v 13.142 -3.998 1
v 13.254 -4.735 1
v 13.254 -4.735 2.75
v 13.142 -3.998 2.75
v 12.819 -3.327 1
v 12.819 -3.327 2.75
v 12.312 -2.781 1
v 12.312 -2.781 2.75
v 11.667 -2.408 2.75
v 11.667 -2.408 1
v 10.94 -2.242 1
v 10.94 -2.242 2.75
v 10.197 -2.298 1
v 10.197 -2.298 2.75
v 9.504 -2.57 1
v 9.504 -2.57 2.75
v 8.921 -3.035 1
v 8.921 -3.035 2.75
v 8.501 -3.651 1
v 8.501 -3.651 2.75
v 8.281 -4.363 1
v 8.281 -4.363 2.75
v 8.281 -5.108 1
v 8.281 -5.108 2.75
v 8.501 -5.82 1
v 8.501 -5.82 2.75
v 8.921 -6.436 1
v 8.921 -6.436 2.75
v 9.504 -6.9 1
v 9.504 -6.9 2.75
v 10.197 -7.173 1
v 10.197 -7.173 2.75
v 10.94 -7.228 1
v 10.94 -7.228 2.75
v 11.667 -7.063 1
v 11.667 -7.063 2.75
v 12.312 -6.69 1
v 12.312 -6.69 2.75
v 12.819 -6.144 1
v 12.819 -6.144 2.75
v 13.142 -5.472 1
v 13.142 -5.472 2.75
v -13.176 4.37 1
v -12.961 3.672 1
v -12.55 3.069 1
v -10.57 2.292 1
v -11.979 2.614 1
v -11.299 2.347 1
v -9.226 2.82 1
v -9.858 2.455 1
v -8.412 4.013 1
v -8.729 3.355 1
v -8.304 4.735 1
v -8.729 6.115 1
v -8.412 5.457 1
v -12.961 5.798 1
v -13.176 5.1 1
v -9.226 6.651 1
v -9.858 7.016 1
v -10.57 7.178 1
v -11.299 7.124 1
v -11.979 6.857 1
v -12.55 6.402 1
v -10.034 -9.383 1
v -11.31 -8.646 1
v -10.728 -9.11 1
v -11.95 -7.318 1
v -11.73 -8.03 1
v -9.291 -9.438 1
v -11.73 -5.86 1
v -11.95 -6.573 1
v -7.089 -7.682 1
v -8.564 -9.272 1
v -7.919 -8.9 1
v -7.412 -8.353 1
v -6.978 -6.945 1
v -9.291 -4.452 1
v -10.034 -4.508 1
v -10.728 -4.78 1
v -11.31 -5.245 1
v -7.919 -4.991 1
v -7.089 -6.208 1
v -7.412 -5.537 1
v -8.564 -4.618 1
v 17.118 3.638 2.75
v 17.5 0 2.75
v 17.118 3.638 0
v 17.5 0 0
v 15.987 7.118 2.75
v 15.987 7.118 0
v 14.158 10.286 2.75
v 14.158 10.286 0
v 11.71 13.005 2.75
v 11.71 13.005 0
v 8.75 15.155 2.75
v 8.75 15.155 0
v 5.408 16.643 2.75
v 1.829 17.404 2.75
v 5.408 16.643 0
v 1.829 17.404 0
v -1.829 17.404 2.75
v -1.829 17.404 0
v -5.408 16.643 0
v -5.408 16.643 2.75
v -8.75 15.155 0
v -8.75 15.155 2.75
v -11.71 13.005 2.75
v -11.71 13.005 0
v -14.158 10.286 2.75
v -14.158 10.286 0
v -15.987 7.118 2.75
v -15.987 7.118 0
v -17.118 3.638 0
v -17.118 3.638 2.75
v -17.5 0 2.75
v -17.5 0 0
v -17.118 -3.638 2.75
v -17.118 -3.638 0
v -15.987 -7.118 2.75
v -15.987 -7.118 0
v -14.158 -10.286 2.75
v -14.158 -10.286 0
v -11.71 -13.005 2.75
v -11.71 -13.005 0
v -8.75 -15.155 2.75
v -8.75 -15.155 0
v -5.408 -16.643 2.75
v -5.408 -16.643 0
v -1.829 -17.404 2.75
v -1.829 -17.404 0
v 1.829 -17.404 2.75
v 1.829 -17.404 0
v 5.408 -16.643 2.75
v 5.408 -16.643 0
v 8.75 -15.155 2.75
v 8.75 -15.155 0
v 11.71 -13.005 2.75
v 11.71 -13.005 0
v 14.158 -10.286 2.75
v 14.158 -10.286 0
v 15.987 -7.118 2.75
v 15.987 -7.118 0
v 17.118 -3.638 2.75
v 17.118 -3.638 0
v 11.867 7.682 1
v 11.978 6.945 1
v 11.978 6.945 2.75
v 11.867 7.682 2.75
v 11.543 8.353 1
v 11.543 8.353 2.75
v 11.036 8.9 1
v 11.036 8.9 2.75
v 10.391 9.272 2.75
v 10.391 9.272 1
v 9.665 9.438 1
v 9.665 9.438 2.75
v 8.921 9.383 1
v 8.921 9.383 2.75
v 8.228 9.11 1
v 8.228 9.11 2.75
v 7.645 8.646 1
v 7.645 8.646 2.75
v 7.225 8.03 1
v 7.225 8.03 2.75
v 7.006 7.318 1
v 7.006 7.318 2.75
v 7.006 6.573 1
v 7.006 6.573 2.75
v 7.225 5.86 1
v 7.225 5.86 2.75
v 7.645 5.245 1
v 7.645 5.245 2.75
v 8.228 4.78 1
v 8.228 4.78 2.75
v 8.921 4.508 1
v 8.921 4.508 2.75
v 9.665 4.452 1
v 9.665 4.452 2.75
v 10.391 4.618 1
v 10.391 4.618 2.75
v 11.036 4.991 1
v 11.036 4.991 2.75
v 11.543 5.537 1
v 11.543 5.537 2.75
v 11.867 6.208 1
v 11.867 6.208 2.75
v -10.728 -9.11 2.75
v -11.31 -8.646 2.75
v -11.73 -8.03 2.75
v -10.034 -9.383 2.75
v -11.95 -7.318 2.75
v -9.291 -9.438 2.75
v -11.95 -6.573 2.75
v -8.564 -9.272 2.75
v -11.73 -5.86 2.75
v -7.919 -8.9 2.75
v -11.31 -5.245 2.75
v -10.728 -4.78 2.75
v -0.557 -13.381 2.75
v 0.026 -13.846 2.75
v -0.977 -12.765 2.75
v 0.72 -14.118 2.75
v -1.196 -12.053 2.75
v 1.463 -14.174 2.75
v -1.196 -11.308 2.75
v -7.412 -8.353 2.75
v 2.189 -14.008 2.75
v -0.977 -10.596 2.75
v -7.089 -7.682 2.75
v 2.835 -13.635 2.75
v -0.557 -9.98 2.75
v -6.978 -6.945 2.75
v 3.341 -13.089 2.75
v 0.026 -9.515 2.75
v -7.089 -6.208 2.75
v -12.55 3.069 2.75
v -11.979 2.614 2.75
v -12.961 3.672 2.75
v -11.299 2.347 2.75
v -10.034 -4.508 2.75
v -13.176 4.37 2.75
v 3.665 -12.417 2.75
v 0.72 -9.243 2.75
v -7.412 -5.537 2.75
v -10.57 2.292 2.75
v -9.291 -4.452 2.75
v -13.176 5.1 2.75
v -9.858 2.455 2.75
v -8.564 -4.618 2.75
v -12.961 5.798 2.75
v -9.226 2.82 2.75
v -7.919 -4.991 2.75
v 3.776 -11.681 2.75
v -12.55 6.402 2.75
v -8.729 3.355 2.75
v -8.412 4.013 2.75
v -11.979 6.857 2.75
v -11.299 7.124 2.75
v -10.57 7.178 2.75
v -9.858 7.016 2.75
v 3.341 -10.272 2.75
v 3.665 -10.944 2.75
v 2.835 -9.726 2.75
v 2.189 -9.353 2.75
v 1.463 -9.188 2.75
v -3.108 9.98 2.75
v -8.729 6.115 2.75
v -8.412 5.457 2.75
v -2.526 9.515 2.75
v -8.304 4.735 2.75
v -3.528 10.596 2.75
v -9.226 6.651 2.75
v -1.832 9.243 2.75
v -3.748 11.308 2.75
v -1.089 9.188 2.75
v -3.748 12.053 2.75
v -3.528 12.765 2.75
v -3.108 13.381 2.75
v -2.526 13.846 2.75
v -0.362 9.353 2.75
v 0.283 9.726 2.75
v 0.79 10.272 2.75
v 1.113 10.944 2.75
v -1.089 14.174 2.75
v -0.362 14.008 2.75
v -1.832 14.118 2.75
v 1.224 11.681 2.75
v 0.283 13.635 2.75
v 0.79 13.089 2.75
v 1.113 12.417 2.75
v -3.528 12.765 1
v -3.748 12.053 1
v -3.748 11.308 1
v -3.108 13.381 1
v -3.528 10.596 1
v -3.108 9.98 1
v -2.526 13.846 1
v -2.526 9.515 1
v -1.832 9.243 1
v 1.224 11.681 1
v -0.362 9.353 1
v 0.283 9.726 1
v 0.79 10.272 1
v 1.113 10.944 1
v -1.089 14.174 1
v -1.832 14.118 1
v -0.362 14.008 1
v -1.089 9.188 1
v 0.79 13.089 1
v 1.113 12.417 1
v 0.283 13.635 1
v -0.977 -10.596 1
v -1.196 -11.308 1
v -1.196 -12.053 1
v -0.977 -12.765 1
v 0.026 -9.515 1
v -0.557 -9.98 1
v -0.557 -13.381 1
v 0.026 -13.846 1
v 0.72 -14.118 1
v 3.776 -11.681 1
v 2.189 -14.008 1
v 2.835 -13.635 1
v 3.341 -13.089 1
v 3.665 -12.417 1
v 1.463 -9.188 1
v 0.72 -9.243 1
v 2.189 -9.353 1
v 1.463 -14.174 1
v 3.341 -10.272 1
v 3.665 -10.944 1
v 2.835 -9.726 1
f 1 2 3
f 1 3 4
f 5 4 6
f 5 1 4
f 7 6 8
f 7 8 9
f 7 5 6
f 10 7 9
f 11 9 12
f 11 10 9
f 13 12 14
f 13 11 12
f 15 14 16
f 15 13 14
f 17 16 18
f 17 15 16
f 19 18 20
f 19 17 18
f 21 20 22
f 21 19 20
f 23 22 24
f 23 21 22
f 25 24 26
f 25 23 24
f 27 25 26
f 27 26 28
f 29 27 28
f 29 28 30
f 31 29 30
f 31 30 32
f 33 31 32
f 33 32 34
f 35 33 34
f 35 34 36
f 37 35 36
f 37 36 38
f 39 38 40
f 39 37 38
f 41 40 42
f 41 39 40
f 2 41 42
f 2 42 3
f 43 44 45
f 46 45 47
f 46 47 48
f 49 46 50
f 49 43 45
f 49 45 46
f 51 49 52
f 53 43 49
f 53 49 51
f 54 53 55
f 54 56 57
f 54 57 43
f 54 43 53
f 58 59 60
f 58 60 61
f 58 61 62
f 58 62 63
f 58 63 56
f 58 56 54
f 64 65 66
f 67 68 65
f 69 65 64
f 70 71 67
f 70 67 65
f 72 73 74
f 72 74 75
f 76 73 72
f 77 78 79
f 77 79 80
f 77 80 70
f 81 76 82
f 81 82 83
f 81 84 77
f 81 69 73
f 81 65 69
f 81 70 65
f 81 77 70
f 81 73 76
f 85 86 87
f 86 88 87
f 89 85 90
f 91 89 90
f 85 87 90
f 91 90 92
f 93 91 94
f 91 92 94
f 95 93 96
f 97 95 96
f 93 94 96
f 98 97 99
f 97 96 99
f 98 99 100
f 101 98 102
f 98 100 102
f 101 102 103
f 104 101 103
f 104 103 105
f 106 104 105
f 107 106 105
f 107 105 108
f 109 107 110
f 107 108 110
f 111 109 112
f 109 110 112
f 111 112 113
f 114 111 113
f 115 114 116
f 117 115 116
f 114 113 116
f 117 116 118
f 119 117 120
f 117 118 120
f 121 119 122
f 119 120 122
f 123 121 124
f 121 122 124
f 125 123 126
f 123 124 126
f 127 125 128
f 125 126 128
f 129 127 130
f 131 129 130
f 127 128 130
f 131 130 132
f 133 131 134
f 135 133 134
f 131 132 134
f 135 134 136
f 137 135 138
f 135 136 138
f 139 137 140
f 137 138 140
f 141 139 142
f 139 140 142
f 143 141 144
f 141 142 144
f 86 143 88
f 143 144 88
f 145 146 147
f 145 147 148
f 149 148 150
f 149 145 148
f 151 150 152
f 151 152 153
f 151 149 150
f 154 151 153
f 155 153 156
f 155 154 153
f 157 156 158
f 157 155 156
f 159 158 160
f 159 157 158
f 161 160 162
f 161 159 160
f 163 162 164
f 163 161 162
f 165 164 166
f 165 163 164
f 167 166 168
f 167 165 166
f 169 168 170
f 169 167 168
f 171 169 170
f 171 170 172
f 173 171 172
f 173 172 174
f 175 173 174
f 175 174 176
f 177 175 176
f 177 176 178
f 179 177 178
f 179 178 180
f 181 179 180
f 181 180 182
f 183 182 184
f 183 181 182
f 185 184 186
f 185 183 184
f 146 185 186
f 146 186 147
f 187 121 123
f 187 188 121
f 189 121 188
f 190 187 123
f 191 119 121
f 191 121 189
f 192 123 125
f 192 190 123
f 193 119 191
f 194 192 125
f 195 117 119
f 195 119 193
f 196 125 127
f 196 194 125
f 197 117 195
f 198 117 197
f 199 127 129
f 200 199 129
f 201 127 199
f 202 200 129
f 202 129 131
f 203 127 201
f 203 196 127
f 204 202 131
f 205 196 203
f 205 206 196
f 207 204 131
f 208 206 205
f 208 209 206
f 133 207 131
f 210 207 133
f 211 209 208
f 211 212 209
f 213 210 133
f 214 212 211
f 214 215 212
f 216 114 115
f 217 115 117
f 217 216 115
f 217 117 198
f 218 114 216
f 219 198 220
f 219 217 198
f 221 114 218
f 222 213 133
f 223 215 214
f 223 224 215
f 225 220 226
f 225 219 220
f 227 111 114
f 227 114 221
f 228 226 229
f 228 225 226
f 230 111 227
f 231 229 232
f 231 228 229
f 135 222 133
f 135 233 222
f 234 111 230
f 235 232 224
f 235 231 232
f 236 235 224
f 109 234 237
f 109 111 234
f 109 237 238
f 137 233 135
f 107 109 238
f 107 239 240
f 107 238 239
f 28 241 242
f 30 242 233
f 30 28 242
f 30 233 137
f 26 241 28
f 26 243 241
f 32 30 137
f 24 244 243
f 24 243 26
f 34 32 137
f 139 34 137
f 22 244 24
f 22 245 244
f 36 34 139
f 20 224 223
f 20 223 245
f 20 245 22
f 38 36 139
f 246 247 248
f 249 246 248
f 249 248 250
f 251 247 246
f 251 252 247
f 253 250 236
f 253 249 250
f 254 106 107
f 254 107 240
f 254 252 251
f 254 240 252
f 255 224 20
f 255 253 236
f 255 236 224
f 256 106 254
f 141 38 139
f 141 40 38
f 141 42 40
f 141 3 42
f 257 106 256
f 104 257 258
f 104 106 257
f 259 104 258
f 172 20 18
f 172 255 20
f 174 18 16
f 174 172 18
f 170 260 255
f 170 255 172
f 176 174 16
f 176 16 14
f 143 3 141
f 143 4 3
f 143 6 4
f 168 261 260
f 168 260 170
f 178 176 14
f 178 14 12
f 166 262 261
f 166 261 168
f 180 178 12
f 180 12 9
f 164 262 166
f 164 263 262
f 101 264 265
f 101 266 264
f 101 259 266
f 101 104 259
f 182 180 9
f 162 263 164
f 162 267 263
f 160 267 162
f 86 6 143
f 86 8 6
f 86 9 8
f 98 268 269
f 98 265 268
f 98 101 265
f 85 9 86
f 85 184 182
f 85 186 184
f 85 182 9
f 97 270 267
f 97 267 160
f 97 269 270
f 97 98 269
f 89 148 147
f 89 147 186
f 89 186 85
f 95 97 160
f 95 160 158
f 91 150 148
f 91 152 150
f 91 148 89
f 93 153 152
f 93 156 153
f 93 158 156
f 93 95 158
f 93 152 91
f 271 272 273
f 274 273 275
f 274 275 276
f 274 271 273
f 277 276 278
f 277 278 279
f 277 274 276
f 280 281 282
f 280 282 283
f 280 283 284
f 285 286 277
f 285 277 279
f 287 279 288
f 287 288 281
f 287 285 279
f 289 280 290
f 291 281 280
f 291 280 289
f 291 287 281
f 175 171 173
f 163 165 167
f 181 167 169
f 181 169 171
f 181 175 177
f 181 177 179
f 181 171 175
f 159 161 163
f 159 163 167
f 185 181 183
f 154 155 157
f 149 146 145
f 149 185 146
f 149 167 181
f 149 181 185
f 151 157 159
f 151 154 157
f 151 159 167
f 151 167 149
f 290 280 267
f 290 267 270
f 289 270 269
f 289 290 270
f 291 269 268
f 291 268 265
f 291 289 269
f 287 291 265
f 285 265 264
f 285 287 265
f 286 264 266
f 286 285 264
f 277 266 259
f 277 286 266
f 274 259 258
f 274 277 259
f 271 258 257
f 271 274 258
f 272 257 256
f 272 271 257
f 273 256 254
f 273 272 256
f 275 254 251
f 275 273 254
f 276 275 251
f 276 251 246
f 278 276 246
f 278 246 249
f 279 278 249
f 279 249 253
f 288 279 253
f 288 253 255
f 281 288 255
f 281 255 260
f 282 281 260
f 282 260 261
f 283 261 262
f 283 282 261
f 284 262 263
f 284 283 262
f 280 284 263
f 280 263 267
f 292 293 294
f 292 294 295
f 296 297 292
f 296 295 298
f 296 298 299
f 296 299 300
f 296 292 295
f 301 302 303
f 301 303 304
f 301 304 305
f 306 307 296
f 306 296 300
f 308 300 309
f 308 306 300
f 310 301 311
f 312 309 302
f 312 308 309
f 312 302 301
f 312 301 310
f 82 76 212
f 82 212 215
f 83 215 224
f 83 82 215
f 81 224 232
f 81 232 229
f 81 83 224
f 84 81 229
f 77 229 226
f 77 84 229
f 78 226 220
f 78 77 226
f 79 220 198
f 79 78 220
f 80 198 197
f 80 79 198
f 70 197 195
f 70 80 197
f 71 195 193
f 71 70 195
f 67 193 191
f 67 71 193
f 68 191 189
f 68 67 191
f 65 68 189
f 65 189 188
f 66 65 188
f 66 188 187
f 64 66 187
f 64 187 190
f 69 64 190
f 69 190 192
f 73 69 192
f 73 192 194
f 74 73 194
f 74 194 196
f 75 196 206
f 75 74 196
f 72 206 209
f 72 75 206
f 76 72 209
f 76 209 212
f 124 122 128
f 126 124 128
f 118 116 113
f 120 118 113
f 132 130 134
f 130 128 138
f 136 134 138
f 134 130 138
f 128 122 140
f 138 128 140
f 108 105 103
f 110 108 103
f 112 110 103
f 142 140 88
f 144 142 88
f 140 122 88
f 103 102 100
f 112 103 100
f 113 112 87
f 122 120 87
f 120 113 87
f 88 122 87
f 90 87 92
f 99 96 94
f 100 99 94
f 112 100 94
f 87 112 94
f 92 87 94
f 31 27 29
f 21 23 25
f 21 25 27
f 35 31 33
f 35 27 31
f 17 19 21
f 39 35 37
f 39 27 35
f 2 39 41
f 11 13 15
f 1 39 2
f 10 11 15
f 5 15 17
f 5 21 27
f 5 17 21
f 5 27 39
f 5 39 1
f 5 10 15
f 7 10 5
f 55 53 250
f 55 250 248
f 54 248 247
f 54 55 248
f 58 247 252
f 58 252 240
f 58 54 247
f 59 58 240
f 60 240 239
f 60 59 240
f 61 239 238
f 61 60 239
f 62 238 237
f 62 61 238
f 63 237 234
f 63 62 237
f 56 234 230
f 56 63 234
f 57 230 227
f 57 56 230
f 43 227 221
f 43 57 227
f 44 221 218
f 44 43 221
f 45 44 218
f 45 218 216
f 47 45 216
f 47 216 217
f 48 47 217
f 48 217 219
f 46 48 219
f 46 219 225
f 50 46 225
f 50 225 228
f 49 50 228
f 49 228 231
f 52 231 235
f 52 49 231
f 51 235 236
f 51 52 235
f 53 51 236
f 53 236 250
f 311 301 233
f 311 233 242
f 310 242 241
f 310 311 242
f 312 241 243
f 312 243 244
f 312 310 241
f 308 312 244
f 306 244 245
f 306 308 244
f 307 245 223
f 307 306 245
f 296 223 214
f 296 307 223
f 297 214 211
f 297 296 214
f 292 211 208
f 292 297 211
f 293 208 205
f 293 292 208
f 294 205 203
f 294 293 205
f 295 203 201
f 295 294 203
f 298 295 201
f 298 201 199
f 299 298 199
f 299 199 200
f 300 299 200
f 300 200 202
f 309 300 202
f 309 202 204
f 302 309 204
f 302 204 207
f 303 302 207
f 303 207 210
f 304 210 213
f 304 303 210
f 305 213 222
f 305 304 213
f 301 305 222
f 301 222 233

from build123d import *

# Parameters (mm, degrees)
F0_R     = 17.5
F1_DEPTH = 1
F2_R     = 17.5
F2_R_2   = 2.5
F2_R_3   = 2.45
F3_DEPTH = 1.75


with BuildPart() as f1:
    # F0 (on Top) → F1 (new body)
    with BuildSketch(Plane.XY):
        Circle(F0_R)
    extrude(amount=F1_DEPTH)

    # F2 (on face) → F3 (join)
    with BuildSketch(Plane.XY.offset(1)):
        Circle(F2_R)
        with Locations((-9.477707, -6.945183)):
            Circle(F2_R_2, mode=Mode.SUBTRACT)
        with Locations((1.275852, -11.680527)):
            Circle(F2_R_2, mode=Mode.SUBTRACT)
        with Locations((10.753559, -4.735343)):
            Circle(F2_R_2, mode=Mode.SUBTRACT)
        with Locations((-10.753559, 4.735343)):
            Circle(F2_R_3, mode=Mode.SUBTRACT)
        with Locations((-1.275852, 11.680527)):
            Circle(F2_R_2, mode=Mode.SUBTRACT)
        with Locations((9.477707, 6.945183)):
            Circle(F2_R_2, mode=Mode.SUBTRACT)
    extrude(amount=F3_DEPTH)


solid = f1.part
